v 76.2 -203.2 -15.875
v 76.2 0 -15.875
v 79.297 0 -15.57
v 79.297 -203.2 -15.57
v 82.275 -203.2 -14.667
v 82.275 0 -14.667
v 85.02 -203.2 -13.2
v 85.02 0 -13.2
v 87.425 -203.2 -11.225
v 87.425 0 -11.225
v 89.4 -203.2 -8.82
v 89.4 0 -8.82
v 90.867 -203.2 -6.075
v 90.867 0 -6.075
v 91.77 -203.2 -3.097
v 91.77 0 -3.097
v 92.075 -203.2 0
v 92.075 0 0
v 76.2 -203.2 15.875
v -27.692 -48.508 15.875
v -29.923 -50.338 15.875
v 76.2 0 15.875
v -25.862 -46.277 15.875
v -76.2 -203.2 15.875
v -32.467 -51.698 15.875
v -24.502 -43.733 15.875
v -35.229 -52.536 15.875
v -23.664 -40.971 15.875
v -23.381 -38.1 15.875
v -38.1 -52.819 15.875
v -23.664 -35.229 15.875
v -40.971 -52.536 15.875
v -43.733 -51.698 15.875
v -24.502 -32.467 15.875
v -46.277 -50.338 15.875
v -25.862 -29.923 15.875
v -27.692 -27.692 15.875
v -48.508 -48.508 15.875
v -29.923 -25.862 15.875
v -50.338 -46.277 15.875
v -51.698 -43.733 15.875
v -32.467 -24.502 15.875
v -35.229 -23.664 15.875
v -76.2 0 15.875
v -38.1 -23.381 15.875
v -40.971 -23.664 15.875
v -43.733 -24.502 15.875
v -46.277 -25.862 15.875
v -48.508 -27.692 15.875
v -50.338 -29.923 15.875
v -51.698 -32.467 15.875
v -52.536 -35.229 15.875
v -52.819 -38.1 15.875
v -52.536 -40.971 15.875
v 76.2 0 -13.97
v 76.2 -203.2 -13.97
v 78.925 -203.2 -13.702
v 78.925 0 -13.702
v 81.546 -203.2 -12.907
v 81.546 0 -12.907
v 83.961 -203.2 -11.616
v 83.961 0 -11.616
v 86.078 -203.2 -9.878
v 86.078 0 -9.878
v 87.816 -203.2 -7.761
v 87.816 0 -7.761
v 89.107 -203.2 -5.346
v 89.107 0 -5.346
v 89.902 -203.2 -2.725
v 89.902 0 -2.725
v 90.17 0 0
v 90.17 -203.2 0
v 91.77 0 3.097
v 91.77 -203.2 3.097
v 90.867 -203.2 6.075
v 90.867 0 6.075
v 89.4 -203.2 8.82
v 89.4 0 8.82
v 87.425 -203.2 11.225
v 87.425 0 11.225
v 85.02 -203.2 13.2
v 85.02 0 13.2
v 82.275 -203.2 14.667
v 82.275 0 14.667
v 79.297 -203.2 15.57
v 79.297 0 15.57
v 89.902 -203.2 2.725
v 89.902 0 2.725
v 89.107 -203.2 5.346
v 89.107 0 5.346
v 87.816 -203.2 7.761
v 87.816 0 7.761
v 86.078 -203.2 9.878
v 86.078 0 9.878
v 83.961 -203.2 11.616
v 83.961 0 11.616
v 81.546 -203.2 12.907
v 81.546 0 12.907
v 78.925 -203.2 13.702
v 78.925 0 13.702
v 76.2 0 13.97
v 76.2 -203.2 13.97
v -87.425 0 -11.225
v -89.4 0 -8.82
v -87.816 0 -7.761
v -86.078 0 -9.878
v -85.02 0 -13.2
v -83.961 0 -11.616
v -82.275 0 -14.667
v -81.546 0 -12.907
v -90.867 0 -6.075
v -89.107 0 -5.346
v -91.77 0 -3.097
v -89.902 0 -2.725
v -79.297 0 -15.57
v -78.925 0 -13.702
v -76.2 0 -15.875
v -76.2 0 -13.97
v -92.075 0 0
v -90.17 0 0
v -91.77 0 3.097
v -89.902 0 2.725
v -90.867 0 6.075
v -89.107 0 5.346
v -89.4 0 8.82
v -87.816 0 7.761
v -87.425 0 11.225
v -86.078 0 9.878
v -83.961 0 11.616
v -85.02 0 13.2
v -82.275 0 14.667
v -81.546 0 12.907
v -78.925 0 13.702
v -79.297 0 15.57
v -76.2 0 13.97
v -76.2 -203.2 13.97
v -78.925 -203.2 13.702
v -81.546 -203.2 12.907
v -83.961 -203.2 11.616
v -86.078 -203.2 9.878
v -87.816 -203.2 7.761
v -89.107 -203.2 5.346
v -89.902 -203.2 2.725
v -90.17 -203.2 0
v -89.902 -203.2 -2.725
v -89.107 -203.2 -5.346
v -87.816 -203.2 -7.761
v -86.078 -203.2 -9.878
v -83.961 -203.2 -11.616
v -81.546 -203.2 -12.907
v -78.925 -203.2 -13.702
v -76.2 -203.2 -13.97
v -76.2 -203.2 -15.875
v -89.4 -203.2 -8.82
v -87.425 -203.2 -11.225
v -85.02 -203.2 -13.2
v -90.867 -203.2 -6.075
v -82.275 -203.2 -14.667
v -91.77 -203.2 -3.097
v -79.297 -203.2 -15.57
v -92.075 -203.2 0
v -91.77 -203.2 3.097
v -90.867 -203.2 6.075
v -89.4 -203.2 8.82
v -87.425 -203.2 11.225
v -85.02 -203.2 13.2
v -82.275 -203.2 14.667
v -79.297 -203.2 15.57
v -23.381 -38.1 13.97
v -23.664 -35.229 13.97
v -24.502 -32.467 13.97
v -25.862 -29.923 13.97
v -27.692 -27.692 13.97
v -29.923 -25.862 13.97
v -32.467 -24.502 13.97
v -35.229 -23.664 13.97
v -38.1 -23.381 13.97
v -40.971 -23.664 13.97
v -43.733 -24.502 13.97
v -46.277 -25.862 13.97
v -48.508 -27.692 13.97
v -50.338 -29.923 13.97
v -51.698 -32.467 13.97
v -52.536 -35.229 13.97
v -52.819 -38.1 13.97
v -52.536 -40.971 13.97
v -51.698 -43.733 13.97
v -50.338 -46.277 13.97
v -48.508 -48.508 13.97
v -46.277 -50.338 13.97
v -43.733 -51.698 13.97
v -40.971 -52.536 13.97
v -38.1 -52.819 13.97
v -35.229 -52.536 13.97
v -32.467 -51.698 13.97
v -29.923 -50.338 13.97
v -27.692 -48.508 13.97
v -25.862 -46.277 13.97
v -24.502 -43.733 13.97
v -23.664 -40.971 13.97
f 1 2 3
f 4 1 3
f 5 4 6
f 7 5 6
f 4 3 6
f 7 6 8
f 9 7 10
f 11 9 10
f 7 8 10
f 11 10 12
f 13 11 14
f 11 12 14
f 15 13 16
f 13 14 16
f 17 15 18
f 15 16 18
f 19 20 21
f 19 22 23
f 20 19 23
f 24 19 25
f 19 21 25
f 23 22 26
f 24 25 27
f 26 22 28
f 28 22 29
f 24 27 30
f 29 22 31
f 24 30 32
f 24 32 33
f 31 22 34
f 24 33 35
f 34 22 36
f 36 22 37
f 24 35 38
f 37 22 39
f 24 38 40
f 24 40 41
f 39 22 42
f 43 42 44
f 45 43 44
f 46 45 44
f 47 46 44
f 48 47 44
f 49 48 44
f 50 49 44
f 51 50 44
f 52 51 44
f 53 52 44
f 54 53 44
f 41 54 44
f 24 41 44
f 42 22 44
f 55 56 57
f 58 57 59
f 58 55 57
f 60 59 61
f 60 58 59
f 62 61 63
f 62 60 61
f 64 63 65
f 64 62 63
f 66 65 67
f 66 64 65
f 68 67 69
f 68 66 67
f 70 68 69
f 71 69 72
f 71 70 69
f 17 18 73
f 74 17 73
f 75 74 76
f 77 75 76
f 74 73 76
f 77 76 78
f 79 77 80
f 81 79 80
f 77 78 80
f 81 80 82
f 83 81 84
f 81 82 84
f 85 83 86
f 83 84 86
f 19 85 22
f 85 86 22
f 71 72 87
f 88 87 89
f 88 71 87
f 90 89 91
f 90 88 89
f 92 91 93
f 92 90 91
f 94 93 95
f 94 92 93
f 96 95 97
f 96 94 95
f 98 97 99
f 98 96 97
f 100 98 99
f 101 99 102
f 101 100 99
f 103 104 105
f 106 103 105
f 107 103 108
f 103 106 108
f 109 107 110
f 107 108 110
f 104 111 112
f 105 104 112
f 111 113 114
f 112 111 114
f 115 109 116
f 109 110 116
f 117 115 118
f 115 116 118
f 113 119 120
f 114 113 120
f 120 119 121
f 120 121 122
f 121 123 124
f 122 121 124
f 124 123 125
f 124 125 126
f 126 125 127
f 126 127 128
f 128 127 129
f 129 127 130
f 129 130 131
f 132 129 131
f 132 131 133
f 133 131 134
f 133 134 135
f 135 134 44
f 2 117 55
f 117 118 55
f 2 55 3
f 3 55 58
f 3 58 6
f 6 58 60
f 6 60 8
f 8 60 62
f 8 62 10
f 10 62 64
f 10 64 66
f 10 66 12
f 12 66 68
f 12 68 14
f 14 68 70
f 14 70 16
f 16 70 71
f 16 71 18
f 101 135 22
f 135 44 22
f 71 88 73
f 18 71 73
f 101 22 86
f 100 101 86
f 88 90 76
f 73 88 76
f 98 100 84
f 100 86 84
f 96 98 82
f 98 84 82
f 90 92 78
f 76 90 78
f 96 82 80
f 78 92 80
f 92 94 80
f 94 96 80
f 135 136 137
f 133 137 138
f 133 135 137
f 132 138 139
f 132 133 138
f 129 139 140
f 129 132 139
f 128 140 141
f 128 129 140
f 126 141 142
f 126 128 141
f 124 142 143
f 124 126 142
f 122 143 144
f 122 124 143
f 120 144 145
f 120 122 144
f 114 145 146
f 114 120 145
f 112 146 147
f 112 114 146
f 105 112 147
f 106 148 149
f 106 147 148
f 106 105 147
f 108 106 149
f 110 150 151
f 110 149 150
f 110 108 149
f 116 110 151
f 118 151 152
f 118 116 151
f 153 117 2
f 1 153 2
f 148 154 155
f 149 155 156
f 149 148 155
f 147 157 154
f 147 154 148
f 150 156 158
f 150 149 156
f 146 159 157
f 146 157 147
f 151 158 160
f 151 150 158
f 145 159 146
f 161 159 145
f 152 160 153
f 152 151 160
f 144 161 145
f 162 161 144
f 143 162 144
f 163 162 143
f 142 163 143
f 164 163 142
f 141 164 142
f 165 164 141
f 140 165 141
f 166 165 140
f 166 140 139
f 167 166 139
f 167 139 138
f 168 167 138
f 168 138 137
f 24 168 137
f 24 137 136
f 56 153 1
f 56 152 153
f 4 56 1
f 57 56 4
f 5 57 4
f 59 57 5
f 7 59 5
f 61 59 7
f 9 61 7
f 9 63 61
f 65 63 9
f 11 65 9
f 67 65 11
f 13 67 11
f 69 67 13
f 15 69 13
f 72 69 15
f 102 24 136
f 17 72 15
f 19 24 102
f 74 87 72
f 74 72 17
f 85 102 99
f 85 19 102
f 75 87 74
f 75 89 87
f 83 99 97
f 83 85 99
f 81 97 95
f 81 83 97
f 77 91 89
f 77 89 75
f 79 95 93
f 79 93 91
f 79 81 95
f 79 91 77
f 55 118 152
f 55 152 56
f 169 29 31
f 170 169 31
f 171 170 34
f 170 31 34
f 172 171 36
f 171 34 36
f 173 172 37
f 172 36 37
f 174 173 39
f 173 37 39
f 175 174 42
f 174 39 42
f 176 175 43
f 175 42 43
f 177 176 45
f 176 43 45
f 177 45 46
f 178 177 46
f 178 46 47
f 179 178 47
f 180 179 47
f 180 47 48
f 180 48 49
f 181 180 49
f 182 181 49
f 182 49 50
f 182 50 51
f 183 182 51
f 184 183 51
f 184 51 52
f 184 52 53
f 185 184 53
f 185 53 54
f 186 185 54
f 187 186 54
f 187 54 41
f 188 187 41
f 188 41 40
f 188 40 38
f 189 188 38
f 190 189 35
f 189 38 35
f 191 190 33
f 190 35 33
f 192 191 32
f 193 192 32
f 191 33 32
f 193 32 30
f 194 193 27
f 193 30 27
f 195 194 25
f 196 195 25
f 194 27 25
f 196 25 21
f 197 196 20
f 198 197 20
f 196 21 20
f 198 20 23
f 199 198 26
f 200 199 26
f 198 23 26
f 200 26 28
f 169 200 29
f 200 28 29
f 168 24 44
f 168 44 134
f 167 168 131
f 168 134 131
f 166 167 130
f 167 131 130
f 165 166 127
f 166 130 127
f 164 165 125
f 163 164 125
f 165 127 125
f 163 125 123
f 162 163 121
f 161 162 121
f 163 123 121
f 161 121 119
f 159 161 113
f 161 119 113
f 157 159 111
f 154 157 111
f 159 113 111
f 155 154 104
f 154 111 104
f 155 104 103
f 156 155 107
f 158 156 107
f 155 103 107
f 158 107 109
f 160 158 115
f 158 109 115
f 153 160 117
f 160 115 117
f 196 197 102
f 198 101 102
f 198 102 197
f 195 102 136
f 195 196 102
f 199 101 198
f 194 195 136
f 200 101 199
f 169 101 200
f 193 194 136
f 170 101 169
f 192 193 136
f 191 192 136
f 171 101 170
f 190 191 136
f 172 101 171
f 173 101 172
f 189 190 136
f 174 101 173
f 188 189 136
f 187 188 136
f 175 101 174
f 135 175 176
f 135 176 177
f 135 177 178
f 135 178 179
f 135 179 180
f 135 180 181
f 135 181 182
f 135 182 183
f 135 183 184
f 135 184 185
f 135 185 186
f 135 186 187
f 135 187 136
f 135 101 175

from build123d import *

# Parameters (mm, degrees)
F2_DEPTH = 203.2
F3_DEPTH = 203.201
F4_R     = 14.7187970876
F5_DEPTH = 12.7


with BuildPart() as f2:
    # F0 (on Front) → F2 (new body)
    with BuildSketch(Plane.XZ):
        with BuildLine():
            Line((-76.2, 15.875), (-76.2, 0))
            Line((-76.2, 0), (-60.325, 0))
            ThreePointArc((-60.325, 0), (-64.9746798487, 11.2253201513), (-76.2, 15.875))
        make_face()
        with BuildLine():
            Line((-60.325, 0), (-76.2, 0))
            Line((-76.2, 0), (-76.2, -15.875))
            ThreePointArc((-76.2, -15.875), (-64.9746798487, -11.2253201513), (-60.325, 0))
        make_face()
        with BuildLine():
            Line((-76.2, -15.875), (-76.2, 0))
            Line((-76.2, 0), (-76.2, 15.875))
            ThreePointArc((-76.2, 15.875), (-92.075, 0), (-76.2, -15.875))
        make_face()
        with BuildLine():
            ThreePointArc((-76.2, 15.875), (-64.9746798487, 11.2253201513), (-60.325, 0))
            Line((-60.325, 0), (60.325, 0))
            ThreePointArc((60.325, 0), (64.9746798487, 11.2253201513), (76.2, 15.875))
            Line((76.2, 15.875), (-76.2, 15.875))
        make_face()
        with BuildLine():
            Line((60.325, 0), (-60.325, 0))
            ThreePointArc((-60.325, 0), (-64.9746798487, -11.2253201513), (-76.2, -15.875))
            Line((-76.2, -15.875), (76.2, -15.875))
            ThreePointArc((76.2, -15.875), (64.9746798487, -11.2253201513), (60.325, 0))
        make_face()
        with BuildLine():
            ThreePointArc((76.2, 15.875), (64.9746798487, 11.2253201513), (60.325, 0))
            Line((60.325, 0), (76.2, 0))
            Line((76.2, 0), (76.2, 15.875))
        make_face()
        with BuildLine():
            Line((76.2, 0), (60.325, 0))
            ThreePointArc((60.325, 0), (64.9746798487, -11.2253201513), (76.2, -15.875))
            Line((76.2, -15.875), (76.2, 0))
        make_face()
        with BuildLine():
            Line((76.2, 0), (76.2, -15.875))
            ThreePointArc((76.2, -15.875), (87.4253201513, -11.2253201513), (92.075, 0))
            ThreePointArc((92.075, 0), (87.4253201513, 11.2253201513), (76.2, 15.875))
            Line((76.2, 15.875), (76.2, 0))
        make_face()
    extrude(amount=F2_DEPTH)

    # F1 (on Front) → F3 (cut, through all)
    with BuildSketch(Plane.XZ):
        with BuildLine():
            ThreePointArc((76.2, -13.97), (62.23, 0), (76.2, 13.97))
            Line((76.2, 13.97), (-76.2, 13.97))
            ThreePointArc((-76.2, 13.97), (-66.3217182668, 9.8782817332), (-62.23, 0))
            ThreePointArc((-62.23, 0), (-66.3217182668, -9.8782817332), (-76.2, -13.97))
            Line((-76.2, -13.97), (76.2, -13.97))
        make_face()
        with BuildLine():
            ThreePointArc((90.17, 0), (86.0782817332, 9.8782817332), (76.2, 13.97))
            Line((76.2, 13.97), (76.2, -13.97))
            ThreePointArc((76.2, -13.97), (86.0782817332, -9.8782817332), (90.17, 0))
        make_face()
        with BuildLine():
            Line((76.2, -13.97), (76.2, 13.97))
            ThreePointArc((76.2, 13.97), (62.23, 0), (76.2, -13.97))
        make_face()
        with BuildLine():
            ThreePointArc((-62.23, 0), (-66.3217182668, 9.8782817332), (-76.2, 13.97))
            Line((-76.2, 13.97), (-76.2, -13.97))
            ThreePointArc((-76.2, -13.97), (-66.3217182668, -9.8782817332), (-62.23, 0))
        make_face()
        with BuildLine():
            Line((-76.2, -13.97), (-76.2, 13.97))
            ThreePointArc((-76.2, 13.97), (-90.17, 0), (-76.2, -13.97))
        make_face()
    extrude(amount=F3_DEPTH, mode=Mode.SUBTRACT)

    # F4 (on face) → F5 (cut)
    with BuildSketch(Plane.XY.offset(15.875)):
        with Locations((-38.1, -38.1)):
            Circle(F4_R)
    extrude(amount=-F5_DEPTH, mode=Mode.SUBTRACT)


solid = f2.part
